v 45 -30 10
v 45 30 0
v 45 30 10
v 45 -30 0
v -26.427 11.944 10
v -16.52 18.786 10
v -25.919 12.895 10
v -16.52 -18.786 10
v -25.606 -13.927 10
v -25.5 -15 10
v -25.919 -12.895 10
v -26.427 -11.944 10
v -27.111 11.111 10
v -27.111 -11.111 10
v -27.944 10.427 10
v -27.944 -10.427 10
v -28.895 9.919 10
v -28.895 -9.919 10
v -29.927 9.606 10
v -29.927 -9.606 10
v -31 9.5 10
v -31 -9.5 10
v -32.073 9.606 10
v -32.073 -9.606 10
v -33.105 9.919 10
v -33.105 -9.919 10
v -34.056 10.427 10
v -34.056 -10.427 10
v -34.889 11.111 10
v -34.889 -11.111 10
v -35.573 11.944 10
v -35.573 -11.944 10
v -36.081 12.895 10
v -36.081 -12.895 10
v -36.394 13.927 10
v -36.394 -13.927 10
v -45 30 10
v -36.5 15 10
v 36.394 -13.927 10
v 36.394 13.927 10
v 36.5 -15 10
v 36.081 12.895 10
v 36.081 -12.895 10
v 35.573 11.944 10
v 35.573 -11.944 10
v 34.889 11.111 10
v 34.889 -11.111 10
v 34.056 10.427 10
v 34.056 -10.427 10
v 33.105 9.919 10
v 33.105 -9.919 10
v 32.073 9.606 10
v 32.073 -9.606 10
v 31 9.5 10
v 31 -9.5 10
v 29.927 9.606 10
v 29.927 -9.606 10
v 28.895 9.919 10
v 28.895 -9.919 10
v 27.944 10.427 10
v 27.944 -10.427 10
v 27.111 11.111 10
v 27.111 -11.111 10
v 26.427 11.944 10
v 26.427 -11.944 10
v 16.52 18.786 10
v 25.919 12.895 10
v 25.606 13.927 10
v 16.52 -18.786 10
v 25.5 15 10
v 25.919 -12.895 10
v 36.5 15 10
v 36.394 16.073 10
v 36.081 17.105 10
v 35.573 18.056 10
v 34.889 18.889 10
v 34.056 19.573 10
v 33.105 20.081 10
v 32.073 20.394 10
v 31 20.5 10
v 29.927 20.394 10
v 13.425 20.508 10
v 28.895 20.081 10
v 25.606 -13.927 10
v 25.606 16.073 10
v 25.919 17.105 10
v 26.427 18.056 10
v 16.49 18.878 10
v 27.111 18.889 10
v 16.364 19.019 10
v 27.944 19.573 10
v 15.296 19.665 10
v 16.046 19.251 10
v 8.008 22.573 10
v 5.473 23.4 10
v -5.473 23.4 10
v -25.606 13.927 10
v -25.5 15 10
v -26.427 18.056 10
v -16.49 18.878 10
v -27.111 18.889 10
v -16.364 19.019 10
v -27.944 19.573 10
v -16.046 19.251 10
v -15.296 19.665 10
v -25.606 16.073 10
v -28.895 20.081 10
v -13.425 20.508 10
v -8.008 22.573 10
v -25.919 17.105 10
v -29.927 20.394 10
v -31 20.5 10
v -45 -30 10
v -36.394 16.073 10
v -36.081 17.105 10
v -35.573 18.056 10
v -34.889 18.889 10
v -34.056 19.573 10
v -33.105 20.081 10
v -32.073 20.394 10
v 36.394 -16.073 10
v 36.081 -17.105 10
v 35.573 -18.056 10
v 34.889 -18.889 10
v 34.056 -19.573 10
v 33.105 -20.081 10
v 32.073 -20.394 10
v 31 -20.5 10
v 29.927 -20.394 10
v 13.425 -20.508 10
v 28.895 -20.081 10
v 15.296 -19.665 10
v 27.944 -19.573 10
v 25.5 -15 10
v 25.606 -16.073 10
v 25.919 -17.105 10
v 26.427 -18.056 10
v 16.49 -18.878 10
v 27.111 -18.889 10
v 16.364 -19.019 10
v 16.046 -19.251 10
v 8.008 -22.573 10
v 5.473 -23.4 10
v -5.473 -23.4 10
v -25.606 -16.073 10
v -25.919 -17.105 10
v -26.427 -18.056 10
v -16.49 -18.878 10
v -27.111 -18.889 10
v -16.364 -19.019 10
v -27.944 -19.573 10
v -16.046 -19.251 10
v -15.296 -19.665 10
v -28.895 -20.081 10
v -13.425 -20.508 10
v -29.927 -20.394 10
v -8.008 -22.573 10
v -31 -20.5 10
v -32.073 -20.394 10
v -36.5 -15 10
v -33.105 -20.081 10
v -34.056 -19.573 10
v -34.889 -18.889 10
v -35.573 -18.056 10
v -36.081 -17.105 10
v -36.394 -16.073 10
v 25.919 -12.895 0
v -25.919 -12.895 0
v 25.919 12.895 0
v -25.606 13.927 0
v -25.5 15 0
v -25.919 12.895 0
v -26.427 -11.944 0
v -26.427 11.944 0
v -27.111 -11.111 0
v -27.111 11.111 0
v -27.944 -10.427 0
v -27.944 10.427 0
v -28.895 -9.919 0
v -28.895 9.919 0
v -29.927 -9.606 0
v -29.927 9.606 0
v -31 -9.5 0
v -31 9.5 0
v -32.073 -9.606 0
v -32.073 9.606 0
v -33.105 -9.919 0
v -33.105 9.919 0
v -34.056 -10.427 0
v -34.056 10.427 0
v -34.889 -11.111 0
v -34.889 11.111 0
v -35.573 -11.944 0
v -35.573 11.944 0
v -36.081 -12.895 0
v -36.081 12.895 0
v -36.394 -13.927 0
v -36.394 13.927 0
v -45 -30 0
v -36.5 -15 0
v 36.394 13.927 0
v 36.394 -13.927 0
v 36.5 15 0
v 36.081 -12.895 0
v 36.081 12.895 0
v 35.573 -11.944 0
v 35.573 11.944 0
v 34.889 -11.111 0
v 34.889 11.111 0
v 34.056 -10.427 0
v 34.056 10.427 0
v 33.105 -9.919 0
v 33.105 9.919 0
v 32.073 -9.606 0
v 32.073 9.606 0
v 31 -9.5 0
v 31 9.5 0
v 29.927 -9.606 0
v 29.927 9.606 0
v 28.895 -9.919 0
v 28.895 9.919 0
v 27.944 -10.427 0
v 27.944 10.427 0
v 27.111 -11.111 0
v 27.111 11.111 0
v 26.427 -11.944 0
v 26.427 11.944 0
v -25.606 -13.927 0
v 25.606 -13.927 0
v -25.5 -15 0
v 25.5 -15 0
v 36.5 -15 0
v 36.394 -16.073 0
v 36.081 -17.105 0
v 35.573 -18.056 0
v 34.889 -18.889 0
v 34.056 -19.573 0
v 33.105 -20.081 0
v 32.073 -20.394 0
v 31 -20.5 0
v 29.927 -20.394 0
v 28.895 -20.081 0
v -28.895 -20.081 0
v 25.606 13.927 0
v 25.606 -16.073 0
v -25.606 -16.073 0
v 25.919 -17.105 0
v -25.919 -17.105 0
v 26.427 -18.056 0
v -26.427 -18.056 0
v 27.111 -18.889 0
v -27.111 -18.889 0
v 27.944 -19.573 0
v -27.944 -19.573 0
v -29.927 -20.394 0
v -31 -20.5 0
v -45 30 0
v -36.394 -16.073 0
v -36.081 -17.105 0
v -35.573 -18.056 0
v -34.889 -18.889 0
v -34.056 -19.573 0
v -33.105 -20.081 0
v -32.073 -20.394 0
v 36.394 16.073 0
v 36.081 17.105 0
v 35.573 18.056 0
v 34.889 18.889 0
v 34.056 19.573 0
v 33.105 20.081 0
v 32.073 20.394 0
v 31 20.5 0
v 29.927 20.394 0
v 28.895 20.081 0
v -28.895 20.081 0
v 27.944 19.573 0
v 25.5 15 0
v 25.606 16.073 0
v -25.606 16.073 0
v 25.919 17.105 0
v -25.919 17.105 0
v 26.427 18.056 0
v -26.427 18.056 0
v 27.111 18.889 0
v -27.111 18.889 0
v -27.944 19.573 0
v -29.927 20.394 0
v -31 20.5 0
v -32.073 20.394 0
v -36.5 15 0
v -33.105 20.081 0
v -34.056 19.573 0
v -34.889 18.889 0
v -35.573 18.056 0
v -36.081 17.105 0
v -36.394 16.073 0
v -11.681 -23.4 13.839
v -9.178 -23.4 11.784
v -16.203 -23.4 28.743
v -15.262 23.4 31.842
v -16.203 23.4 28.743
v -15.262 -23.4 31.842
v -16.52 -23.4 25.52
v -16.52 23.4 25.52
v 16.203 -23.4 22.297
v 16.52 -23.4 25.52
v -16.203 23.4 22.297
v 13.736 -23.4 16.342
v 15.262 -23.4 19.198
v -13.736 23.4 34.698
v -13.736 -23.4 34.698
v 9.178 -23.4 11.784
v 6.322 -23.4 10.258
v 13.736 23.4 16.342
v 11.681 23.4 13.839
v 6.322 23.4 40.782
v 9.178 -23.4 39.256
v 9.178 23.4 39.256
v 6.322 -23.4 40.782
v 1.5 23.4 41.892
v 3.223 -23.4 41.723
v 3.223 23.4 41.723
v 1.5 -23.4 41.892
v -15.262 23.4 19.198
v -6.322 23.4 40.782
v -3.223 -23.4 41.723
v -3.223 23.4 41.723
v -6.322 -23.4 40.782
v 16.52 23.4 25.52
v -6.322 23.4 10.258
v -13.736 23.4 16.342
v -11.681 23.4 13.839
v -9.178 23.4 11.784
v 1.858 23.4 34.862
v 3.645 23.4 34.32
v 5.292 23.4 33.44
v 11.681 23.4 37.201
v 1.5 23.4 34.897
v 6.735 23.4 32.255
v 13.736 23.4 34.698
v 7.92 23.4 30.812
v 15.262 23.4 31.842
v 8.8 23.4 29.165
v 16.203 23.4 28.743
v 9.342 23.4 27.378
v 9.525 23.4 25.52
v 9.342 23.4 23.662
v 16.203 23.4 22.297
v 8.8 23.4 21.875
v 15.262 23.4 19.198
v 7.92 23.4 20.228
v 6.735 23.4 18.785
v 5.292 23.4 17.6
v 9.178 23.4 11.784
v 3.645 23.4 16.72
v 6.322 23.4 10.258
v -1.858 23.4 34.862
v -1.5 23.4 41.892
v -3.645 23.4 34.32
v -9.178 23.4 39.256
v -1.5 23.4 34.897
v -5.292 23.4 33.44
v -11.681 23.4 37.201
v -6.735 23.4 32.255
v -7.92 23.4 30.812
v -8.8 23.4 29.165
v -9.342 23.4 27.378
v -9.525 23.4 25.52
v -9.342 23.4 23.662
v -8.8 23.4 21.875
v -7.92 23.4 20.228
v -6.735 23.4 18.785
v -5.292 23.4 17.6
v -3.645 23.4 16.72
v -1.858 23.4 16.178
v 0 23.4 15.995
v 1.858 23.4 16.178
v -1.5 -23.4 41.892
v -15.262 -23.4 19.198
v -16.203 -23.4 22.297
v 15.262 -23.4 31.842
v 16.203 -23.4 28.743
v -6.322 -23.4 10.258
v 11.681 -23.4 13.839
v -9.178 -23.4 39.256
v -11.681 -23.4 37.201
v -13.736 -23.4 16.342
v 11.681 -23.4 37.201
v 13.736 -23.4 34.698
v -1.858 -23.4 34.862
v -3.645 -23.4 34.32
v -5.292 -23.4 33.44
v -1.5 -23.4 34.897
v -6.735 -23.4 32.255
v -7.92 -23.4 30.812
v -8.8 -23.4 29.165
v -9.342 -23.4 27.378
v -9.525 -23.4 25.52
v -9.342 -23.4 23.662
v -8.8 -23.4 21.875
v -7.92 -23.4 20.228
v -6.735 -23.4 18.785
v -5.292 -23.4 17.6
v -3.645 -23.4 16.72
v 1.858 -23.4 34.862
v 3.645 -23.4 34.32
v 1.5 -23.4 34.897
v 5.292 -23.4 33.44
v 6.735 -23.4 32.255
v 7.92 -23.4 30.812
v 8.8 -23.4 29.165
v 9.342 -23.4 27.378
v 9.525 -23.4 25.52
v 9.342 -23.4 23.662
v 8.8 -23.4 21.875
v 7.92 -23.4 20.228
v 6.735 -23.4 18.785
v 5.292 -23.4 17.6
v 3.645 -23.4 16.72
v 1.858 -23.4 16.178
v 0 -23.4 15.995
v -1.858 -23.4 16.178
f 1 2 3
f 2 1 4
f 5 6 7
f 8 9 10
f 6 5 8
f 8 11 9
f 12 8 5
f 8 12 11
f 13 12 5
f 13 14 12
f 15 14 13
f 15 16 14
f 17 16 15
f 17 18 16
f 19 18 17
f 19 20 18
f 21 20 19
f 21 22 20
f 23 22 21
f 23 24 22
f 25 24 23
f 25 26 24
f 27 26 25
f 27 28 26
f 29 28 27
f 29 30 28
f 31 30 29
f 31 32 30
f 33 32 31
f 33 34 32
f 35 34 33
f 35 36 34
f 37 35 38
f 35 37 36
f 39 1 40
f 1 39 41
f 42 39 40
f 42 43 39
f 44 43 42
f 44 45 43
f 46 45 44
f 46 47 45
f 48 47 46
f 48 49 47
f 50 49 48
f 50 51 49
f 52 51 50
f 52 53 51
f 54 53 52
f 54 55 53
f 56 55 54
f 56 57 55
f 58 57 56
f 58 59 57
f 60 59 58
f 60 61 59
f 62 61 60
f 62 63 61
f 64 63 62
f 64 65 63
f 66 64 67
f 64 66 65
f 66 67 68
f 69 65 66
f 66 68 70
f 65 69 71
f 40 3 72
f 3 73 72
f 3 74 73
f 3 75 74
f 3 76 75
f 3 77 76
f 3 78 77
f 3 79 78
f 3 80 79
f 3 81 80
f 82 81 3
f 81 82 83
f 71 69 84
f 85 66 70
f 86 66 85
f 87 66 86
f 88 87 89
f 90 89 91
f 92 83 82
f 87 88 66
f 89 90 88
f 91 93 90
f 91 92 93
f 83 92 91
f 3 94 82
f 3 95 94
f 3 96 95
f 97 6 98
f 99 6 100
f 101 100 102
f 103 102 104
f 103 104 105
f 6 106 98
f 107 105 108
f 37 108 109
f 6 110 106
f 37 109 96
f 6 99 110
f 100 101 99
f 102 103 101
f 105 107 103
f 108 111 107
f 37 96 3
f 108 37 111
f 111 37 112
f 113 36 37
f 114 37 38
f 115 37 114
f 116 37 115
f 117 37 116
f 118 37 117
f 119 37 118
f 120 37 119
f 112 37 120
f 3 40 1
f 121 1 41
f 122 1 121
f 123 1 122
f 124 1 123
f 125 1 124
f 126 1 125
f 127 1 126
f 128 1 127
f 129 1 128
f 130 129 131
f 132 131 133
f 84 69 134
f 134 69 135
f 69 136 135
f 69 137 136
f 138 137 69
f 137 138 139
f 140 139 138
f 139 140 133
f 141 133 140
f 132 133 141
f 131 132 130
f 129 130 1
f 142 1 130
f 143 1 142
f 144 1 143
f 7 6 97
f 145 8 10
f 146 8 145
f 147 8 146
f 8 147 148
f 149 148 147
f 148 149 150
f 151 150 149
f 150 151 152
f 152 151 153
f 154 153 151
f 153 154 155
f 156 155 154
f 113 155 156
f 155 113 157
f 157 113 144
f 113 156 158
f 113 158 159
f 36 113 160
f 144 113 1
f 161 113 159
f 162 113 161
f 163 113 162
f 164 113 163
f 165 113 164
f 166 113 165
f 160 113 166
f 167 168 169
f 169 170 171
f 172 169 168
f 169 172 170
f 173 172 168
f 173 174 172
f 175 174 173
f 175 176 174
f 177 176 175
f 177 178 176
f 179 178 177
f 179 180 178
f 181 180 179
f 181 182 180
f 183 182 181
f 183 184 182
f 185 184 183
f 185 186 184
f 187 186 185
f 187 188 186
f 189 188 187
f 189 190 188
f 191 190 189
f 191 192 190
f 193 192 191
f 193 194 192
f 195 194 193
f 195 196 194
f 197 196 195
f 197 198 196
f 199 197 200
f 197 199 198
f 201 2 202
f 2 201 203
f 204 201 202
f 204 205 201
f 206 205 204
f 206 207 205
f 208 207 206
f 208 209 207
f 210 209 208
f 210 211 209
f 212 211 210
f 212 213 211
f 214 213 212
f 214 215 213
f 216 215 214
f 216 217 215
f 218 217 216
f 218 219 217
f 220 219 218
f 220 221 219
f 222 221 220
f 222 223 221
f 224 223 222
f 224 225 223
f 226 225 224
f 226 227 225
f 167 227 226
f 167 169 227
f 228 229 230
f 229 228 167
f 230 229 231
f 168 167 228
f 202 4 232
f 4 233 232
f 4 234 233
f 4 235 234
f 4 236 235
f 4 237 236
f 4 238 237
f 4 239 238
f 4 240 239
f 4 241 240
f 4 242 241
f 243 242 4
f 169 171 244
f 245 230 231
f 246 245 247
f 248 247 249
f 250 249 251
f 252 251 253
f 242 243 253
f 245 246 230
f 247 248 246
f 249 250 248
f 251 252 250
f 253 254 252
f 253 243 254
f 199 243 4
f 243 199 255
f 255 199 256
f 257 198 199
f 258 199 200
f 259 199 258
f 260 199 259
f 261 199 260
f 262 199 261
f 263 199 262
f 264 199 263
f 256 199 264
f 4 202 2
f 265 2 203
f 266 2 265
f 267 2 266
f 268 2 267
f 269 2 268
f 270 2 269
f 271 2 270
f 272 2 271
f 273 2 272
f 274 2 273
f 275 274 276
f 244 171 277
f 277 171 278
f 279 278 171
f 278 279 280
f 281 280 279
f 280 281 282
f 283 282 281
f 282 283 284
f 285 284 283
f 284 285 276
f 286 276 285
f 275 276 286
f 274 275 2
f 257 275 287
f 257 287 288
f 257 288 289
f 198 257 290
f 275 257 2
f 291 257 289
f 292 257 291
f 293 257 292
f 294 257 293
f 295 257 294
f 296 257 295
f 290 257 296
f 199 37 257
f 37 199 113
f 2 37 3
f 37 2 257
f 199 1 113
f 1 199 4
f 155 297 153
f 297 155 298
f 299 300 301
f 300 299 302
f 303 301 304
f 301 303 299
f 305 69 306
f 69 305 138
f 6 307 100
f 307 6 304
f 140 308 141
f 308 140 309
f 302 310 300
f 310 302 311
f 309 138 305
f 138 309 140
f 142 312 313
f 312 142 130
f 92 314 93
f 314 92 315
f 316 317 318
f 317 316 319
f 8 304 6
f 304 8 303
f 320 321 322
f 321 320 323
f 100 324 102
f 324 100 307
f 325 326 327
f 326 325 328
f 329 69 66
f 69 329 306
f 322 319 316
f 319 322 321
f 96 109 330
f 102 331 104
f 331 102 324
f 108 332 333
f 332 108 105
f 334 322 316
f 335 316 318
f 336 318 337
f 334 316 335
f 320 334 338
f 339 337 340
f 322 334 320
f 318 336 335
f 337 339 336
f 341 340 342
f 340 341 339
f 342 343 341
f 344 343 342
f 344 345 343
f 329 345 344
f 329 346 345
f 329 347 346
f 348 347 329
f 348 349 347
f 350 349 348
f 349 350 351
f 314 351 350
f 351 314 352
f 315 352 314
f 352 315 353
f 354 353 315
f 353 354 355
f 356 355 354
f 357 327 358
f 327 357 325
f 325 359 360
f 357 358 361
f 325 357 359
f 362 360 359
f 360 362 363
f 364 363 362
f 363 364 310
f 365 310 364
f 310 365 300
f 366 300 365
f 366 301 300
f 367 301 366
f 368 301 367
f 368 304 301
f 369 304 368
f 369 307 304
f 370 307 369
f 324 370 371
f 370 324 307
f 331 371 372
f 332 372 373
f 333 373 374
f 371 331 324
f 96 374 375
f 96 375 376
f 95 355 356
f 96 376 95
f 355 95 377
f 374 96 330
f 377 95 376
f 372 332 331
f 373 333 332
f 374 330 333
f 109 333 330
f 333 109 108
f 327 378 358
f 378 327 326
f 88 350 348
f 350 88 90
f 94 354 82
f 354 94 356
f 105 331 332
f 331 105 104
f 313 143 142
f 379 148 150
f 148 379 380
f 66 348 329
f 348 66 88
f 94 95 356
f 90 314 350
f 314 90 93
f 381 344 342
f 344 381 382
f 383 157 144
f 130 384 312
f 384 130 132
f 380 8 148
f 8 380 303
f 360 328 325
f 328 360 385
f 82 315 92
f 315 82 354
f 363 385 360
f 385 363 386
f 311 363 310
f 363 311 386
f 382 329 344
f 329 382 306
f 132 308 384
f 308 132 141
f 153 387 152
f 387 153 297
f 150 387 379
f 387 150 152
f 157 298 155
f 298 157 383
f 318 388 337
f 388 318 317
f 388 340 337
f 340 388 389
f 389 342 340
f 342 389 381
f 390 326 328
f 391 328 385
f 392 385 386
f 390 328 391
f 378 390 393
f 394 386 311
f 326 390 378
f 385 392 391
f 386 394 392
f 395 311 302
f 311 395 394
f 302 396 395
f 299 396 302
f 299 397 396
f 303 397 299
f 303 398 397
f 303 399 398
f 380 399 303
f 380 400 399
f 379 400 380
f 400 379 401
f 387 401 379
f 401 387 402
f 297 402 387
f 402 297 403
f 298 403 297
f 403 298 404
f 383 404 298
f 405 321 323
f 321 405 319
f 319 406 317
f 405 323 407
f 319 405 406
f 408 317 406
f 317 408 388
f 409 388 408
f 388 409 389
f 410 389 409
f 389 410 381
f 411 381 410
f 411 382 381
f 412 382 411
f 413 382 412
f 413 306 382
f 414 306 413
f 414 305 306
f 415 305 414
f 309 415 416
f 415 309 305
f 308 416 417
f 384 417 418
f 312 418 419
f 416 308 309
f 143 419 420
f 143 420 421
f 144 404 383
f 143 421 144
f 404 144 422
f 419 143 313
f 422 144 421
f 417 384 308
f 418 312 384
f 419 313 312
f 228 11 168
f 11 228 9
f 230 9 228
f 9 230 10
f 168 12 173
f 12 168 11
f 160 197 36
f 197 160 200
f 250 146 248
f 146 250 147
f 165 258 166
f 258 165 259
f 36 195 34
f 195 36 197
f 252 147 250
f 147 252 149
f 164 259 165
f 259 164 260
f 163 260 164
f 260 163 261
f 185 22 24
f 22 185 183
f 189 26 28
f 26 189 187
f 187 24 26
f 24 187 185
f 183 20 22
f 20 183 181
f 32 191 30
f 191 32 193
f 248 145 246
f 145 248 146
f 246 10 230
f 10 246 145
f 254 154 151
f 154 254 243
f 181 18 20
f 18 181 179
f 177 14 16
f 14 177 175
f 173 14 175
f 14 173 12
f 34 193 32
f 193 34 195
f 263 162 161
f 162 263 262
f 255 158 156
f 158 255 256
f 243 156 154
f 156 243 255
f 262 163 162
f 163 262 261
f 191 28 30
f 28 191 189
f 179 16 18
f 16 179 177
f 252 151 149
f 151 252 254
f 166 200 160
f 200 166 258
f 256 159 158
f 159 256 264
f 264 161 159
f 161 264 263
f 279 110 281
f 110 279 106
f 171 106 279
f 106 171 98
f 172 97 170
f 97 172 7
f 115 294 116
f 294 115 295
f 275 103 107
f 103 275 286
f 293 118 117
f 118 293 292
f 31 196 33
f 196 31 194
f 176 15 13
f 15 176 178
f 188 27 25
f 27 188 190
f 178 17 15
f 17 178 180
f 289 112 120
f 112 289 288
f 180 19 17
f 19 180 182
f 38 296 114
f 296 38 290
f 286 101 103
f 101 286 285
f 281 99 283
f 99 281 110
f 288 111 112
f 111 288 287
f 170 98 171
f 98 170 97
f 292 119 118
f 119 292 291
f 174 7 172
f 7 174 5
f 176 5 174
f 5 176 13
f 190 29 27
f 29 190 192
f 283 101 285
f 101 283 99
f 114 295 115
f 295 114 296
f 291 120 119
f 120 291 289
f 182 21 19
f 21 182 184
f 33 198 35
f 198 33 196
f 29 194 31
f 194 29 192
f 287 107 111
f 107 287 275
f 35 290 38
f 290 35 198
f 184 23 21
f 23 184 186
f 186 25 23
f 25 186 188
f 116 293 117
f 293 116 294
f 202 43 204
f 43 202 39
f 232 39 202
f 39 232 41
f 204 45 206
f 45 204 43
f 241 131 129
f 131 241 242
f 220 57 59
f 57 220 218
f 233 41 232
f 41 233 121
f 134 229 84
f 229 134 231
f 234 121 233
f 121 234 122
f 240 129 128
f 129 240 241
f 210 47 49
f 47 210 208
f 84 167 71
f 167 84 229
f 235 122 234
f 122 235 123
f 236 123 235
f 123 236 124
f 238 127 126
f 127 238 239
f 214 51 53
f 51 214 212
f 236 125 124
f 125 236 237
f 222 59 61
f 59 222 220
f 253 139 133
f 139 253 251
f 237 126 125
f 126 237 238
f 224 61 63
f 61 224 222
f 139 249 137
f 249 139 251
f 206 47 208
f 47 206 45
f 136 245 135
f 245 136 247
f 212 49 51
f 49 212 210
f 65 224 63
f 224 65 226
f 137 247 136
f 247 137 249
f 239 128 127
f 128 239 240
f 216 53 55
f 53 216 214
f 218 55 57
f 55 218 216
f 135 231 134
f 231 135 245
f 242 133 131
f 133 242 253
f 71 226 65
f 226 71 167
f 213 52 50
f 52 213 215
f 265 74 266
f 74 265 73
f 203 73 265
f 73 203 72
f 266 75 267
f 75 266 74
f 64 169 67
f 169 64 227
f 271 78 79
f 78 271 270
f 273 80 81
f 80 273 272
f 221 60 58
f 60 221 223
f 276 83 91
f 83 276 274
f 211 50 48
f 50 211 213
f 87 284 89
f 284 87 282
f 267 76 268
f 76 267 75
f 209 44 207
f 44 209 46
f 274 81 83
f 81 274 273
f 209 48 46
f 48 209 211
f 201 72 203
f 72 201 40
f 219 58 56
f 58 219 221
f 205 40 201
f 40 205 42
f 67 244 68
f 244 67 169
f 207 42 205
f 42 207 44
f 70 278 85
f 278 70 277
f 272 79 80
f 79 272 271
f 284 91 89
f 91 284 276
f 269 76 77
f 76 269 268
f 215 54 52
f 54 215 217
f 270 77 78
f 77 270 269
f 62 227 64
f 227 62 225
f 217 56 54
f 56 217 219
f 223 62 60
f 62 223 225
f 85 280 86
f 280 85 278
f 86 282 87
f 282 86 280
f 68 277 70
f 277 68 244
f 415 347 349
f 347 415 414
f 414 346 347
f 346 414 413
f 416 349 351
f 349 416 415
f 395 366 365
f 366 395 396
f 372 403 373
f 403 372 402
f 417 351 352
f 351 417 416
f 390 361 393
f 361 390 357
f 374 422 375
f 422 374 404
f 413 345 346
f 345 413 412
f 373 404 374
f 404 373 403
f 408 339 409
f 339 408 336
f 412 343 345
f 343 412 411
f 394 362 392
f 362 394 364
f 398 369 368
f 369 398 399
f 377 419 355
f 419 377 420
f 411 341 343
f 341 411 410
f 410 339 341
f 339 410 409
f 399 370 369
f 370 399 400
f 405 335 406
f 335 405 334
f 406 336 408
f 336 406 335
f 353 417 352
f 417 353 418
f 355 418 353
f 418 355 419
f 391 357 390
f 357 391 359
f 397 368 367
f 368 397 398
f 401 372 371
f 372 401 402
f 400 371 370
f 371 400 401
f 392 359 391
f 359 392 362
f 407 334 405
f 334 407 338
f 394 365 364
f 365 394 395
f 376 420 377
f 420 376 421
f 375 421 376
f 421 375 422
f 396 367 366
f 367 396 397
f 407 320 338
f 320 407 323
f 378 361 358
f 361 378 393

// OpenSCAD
$fn = 32;

// ----------------------------------------------------------------------
// Bearing block: 90 x 60 mm base, 19.05 mm bore at 25.52 mm
// ----------------------------------------------------------------------

// --- parameters (mm) ---
base_w = 90;              // base width
base_d = 60;              // base depth
base_t = 10;              // base thickness
bore_d = 19.05;           // shaft / bearing bore
house_r = 16.52;          // housing outer radius
house_len = 46.8;         // housing length along the shaft
foot_w = 33.04;           // foot width under the housing
foot_len = 36.8;          // foot length along the shaft
axis_z = 25.52;           // bore axis height above the base
holes_d = 11;             // mounting holes
hole_x = 31;              // mounting hole spacing
groove_w = 3;             // oil groove width

difference() {
  union() {
    /* base plate with its underside on z = 0 */
    translate([0, 0, base_t / 2]) cube([base_w, base_d, base_t], center = true);
    /* hull foot: a straight web blending into the round housing */
    hull() {
      translate([0, 0, base_t - 0.5]) cube([foot_w, foot_len, 1.6], center = true);
      translate([0, 0, axis_z]) rotate([-90, 0, 0]) cylinder(h = house_len, d = 2 * house_r, center = true);
    }
  }
  /* bore through the housing, 2.5 mm clear on both sides */
  translate([0, 0, axis_z]) rotate([-90, 0, 0]) cylinder(h = house_len + 5, d = bore_d, center = true);
  /* oil groove from the top of the housing into the bore */
  translate([-groove_w / 2, -house_len / 2 - 2.5, axis_z + bore_d * 0.17]) cube([groove_w, house_len + 5, house_r + 5]);
  /* mounting holes through the base plate */
  for (hx = [-31, 31]) {
    for (hy = [-15, 15]) {
      translate([hx, hy, -2.5]) cylinder(h = base_t + 5, d = holes_d);
    }
  }
}
